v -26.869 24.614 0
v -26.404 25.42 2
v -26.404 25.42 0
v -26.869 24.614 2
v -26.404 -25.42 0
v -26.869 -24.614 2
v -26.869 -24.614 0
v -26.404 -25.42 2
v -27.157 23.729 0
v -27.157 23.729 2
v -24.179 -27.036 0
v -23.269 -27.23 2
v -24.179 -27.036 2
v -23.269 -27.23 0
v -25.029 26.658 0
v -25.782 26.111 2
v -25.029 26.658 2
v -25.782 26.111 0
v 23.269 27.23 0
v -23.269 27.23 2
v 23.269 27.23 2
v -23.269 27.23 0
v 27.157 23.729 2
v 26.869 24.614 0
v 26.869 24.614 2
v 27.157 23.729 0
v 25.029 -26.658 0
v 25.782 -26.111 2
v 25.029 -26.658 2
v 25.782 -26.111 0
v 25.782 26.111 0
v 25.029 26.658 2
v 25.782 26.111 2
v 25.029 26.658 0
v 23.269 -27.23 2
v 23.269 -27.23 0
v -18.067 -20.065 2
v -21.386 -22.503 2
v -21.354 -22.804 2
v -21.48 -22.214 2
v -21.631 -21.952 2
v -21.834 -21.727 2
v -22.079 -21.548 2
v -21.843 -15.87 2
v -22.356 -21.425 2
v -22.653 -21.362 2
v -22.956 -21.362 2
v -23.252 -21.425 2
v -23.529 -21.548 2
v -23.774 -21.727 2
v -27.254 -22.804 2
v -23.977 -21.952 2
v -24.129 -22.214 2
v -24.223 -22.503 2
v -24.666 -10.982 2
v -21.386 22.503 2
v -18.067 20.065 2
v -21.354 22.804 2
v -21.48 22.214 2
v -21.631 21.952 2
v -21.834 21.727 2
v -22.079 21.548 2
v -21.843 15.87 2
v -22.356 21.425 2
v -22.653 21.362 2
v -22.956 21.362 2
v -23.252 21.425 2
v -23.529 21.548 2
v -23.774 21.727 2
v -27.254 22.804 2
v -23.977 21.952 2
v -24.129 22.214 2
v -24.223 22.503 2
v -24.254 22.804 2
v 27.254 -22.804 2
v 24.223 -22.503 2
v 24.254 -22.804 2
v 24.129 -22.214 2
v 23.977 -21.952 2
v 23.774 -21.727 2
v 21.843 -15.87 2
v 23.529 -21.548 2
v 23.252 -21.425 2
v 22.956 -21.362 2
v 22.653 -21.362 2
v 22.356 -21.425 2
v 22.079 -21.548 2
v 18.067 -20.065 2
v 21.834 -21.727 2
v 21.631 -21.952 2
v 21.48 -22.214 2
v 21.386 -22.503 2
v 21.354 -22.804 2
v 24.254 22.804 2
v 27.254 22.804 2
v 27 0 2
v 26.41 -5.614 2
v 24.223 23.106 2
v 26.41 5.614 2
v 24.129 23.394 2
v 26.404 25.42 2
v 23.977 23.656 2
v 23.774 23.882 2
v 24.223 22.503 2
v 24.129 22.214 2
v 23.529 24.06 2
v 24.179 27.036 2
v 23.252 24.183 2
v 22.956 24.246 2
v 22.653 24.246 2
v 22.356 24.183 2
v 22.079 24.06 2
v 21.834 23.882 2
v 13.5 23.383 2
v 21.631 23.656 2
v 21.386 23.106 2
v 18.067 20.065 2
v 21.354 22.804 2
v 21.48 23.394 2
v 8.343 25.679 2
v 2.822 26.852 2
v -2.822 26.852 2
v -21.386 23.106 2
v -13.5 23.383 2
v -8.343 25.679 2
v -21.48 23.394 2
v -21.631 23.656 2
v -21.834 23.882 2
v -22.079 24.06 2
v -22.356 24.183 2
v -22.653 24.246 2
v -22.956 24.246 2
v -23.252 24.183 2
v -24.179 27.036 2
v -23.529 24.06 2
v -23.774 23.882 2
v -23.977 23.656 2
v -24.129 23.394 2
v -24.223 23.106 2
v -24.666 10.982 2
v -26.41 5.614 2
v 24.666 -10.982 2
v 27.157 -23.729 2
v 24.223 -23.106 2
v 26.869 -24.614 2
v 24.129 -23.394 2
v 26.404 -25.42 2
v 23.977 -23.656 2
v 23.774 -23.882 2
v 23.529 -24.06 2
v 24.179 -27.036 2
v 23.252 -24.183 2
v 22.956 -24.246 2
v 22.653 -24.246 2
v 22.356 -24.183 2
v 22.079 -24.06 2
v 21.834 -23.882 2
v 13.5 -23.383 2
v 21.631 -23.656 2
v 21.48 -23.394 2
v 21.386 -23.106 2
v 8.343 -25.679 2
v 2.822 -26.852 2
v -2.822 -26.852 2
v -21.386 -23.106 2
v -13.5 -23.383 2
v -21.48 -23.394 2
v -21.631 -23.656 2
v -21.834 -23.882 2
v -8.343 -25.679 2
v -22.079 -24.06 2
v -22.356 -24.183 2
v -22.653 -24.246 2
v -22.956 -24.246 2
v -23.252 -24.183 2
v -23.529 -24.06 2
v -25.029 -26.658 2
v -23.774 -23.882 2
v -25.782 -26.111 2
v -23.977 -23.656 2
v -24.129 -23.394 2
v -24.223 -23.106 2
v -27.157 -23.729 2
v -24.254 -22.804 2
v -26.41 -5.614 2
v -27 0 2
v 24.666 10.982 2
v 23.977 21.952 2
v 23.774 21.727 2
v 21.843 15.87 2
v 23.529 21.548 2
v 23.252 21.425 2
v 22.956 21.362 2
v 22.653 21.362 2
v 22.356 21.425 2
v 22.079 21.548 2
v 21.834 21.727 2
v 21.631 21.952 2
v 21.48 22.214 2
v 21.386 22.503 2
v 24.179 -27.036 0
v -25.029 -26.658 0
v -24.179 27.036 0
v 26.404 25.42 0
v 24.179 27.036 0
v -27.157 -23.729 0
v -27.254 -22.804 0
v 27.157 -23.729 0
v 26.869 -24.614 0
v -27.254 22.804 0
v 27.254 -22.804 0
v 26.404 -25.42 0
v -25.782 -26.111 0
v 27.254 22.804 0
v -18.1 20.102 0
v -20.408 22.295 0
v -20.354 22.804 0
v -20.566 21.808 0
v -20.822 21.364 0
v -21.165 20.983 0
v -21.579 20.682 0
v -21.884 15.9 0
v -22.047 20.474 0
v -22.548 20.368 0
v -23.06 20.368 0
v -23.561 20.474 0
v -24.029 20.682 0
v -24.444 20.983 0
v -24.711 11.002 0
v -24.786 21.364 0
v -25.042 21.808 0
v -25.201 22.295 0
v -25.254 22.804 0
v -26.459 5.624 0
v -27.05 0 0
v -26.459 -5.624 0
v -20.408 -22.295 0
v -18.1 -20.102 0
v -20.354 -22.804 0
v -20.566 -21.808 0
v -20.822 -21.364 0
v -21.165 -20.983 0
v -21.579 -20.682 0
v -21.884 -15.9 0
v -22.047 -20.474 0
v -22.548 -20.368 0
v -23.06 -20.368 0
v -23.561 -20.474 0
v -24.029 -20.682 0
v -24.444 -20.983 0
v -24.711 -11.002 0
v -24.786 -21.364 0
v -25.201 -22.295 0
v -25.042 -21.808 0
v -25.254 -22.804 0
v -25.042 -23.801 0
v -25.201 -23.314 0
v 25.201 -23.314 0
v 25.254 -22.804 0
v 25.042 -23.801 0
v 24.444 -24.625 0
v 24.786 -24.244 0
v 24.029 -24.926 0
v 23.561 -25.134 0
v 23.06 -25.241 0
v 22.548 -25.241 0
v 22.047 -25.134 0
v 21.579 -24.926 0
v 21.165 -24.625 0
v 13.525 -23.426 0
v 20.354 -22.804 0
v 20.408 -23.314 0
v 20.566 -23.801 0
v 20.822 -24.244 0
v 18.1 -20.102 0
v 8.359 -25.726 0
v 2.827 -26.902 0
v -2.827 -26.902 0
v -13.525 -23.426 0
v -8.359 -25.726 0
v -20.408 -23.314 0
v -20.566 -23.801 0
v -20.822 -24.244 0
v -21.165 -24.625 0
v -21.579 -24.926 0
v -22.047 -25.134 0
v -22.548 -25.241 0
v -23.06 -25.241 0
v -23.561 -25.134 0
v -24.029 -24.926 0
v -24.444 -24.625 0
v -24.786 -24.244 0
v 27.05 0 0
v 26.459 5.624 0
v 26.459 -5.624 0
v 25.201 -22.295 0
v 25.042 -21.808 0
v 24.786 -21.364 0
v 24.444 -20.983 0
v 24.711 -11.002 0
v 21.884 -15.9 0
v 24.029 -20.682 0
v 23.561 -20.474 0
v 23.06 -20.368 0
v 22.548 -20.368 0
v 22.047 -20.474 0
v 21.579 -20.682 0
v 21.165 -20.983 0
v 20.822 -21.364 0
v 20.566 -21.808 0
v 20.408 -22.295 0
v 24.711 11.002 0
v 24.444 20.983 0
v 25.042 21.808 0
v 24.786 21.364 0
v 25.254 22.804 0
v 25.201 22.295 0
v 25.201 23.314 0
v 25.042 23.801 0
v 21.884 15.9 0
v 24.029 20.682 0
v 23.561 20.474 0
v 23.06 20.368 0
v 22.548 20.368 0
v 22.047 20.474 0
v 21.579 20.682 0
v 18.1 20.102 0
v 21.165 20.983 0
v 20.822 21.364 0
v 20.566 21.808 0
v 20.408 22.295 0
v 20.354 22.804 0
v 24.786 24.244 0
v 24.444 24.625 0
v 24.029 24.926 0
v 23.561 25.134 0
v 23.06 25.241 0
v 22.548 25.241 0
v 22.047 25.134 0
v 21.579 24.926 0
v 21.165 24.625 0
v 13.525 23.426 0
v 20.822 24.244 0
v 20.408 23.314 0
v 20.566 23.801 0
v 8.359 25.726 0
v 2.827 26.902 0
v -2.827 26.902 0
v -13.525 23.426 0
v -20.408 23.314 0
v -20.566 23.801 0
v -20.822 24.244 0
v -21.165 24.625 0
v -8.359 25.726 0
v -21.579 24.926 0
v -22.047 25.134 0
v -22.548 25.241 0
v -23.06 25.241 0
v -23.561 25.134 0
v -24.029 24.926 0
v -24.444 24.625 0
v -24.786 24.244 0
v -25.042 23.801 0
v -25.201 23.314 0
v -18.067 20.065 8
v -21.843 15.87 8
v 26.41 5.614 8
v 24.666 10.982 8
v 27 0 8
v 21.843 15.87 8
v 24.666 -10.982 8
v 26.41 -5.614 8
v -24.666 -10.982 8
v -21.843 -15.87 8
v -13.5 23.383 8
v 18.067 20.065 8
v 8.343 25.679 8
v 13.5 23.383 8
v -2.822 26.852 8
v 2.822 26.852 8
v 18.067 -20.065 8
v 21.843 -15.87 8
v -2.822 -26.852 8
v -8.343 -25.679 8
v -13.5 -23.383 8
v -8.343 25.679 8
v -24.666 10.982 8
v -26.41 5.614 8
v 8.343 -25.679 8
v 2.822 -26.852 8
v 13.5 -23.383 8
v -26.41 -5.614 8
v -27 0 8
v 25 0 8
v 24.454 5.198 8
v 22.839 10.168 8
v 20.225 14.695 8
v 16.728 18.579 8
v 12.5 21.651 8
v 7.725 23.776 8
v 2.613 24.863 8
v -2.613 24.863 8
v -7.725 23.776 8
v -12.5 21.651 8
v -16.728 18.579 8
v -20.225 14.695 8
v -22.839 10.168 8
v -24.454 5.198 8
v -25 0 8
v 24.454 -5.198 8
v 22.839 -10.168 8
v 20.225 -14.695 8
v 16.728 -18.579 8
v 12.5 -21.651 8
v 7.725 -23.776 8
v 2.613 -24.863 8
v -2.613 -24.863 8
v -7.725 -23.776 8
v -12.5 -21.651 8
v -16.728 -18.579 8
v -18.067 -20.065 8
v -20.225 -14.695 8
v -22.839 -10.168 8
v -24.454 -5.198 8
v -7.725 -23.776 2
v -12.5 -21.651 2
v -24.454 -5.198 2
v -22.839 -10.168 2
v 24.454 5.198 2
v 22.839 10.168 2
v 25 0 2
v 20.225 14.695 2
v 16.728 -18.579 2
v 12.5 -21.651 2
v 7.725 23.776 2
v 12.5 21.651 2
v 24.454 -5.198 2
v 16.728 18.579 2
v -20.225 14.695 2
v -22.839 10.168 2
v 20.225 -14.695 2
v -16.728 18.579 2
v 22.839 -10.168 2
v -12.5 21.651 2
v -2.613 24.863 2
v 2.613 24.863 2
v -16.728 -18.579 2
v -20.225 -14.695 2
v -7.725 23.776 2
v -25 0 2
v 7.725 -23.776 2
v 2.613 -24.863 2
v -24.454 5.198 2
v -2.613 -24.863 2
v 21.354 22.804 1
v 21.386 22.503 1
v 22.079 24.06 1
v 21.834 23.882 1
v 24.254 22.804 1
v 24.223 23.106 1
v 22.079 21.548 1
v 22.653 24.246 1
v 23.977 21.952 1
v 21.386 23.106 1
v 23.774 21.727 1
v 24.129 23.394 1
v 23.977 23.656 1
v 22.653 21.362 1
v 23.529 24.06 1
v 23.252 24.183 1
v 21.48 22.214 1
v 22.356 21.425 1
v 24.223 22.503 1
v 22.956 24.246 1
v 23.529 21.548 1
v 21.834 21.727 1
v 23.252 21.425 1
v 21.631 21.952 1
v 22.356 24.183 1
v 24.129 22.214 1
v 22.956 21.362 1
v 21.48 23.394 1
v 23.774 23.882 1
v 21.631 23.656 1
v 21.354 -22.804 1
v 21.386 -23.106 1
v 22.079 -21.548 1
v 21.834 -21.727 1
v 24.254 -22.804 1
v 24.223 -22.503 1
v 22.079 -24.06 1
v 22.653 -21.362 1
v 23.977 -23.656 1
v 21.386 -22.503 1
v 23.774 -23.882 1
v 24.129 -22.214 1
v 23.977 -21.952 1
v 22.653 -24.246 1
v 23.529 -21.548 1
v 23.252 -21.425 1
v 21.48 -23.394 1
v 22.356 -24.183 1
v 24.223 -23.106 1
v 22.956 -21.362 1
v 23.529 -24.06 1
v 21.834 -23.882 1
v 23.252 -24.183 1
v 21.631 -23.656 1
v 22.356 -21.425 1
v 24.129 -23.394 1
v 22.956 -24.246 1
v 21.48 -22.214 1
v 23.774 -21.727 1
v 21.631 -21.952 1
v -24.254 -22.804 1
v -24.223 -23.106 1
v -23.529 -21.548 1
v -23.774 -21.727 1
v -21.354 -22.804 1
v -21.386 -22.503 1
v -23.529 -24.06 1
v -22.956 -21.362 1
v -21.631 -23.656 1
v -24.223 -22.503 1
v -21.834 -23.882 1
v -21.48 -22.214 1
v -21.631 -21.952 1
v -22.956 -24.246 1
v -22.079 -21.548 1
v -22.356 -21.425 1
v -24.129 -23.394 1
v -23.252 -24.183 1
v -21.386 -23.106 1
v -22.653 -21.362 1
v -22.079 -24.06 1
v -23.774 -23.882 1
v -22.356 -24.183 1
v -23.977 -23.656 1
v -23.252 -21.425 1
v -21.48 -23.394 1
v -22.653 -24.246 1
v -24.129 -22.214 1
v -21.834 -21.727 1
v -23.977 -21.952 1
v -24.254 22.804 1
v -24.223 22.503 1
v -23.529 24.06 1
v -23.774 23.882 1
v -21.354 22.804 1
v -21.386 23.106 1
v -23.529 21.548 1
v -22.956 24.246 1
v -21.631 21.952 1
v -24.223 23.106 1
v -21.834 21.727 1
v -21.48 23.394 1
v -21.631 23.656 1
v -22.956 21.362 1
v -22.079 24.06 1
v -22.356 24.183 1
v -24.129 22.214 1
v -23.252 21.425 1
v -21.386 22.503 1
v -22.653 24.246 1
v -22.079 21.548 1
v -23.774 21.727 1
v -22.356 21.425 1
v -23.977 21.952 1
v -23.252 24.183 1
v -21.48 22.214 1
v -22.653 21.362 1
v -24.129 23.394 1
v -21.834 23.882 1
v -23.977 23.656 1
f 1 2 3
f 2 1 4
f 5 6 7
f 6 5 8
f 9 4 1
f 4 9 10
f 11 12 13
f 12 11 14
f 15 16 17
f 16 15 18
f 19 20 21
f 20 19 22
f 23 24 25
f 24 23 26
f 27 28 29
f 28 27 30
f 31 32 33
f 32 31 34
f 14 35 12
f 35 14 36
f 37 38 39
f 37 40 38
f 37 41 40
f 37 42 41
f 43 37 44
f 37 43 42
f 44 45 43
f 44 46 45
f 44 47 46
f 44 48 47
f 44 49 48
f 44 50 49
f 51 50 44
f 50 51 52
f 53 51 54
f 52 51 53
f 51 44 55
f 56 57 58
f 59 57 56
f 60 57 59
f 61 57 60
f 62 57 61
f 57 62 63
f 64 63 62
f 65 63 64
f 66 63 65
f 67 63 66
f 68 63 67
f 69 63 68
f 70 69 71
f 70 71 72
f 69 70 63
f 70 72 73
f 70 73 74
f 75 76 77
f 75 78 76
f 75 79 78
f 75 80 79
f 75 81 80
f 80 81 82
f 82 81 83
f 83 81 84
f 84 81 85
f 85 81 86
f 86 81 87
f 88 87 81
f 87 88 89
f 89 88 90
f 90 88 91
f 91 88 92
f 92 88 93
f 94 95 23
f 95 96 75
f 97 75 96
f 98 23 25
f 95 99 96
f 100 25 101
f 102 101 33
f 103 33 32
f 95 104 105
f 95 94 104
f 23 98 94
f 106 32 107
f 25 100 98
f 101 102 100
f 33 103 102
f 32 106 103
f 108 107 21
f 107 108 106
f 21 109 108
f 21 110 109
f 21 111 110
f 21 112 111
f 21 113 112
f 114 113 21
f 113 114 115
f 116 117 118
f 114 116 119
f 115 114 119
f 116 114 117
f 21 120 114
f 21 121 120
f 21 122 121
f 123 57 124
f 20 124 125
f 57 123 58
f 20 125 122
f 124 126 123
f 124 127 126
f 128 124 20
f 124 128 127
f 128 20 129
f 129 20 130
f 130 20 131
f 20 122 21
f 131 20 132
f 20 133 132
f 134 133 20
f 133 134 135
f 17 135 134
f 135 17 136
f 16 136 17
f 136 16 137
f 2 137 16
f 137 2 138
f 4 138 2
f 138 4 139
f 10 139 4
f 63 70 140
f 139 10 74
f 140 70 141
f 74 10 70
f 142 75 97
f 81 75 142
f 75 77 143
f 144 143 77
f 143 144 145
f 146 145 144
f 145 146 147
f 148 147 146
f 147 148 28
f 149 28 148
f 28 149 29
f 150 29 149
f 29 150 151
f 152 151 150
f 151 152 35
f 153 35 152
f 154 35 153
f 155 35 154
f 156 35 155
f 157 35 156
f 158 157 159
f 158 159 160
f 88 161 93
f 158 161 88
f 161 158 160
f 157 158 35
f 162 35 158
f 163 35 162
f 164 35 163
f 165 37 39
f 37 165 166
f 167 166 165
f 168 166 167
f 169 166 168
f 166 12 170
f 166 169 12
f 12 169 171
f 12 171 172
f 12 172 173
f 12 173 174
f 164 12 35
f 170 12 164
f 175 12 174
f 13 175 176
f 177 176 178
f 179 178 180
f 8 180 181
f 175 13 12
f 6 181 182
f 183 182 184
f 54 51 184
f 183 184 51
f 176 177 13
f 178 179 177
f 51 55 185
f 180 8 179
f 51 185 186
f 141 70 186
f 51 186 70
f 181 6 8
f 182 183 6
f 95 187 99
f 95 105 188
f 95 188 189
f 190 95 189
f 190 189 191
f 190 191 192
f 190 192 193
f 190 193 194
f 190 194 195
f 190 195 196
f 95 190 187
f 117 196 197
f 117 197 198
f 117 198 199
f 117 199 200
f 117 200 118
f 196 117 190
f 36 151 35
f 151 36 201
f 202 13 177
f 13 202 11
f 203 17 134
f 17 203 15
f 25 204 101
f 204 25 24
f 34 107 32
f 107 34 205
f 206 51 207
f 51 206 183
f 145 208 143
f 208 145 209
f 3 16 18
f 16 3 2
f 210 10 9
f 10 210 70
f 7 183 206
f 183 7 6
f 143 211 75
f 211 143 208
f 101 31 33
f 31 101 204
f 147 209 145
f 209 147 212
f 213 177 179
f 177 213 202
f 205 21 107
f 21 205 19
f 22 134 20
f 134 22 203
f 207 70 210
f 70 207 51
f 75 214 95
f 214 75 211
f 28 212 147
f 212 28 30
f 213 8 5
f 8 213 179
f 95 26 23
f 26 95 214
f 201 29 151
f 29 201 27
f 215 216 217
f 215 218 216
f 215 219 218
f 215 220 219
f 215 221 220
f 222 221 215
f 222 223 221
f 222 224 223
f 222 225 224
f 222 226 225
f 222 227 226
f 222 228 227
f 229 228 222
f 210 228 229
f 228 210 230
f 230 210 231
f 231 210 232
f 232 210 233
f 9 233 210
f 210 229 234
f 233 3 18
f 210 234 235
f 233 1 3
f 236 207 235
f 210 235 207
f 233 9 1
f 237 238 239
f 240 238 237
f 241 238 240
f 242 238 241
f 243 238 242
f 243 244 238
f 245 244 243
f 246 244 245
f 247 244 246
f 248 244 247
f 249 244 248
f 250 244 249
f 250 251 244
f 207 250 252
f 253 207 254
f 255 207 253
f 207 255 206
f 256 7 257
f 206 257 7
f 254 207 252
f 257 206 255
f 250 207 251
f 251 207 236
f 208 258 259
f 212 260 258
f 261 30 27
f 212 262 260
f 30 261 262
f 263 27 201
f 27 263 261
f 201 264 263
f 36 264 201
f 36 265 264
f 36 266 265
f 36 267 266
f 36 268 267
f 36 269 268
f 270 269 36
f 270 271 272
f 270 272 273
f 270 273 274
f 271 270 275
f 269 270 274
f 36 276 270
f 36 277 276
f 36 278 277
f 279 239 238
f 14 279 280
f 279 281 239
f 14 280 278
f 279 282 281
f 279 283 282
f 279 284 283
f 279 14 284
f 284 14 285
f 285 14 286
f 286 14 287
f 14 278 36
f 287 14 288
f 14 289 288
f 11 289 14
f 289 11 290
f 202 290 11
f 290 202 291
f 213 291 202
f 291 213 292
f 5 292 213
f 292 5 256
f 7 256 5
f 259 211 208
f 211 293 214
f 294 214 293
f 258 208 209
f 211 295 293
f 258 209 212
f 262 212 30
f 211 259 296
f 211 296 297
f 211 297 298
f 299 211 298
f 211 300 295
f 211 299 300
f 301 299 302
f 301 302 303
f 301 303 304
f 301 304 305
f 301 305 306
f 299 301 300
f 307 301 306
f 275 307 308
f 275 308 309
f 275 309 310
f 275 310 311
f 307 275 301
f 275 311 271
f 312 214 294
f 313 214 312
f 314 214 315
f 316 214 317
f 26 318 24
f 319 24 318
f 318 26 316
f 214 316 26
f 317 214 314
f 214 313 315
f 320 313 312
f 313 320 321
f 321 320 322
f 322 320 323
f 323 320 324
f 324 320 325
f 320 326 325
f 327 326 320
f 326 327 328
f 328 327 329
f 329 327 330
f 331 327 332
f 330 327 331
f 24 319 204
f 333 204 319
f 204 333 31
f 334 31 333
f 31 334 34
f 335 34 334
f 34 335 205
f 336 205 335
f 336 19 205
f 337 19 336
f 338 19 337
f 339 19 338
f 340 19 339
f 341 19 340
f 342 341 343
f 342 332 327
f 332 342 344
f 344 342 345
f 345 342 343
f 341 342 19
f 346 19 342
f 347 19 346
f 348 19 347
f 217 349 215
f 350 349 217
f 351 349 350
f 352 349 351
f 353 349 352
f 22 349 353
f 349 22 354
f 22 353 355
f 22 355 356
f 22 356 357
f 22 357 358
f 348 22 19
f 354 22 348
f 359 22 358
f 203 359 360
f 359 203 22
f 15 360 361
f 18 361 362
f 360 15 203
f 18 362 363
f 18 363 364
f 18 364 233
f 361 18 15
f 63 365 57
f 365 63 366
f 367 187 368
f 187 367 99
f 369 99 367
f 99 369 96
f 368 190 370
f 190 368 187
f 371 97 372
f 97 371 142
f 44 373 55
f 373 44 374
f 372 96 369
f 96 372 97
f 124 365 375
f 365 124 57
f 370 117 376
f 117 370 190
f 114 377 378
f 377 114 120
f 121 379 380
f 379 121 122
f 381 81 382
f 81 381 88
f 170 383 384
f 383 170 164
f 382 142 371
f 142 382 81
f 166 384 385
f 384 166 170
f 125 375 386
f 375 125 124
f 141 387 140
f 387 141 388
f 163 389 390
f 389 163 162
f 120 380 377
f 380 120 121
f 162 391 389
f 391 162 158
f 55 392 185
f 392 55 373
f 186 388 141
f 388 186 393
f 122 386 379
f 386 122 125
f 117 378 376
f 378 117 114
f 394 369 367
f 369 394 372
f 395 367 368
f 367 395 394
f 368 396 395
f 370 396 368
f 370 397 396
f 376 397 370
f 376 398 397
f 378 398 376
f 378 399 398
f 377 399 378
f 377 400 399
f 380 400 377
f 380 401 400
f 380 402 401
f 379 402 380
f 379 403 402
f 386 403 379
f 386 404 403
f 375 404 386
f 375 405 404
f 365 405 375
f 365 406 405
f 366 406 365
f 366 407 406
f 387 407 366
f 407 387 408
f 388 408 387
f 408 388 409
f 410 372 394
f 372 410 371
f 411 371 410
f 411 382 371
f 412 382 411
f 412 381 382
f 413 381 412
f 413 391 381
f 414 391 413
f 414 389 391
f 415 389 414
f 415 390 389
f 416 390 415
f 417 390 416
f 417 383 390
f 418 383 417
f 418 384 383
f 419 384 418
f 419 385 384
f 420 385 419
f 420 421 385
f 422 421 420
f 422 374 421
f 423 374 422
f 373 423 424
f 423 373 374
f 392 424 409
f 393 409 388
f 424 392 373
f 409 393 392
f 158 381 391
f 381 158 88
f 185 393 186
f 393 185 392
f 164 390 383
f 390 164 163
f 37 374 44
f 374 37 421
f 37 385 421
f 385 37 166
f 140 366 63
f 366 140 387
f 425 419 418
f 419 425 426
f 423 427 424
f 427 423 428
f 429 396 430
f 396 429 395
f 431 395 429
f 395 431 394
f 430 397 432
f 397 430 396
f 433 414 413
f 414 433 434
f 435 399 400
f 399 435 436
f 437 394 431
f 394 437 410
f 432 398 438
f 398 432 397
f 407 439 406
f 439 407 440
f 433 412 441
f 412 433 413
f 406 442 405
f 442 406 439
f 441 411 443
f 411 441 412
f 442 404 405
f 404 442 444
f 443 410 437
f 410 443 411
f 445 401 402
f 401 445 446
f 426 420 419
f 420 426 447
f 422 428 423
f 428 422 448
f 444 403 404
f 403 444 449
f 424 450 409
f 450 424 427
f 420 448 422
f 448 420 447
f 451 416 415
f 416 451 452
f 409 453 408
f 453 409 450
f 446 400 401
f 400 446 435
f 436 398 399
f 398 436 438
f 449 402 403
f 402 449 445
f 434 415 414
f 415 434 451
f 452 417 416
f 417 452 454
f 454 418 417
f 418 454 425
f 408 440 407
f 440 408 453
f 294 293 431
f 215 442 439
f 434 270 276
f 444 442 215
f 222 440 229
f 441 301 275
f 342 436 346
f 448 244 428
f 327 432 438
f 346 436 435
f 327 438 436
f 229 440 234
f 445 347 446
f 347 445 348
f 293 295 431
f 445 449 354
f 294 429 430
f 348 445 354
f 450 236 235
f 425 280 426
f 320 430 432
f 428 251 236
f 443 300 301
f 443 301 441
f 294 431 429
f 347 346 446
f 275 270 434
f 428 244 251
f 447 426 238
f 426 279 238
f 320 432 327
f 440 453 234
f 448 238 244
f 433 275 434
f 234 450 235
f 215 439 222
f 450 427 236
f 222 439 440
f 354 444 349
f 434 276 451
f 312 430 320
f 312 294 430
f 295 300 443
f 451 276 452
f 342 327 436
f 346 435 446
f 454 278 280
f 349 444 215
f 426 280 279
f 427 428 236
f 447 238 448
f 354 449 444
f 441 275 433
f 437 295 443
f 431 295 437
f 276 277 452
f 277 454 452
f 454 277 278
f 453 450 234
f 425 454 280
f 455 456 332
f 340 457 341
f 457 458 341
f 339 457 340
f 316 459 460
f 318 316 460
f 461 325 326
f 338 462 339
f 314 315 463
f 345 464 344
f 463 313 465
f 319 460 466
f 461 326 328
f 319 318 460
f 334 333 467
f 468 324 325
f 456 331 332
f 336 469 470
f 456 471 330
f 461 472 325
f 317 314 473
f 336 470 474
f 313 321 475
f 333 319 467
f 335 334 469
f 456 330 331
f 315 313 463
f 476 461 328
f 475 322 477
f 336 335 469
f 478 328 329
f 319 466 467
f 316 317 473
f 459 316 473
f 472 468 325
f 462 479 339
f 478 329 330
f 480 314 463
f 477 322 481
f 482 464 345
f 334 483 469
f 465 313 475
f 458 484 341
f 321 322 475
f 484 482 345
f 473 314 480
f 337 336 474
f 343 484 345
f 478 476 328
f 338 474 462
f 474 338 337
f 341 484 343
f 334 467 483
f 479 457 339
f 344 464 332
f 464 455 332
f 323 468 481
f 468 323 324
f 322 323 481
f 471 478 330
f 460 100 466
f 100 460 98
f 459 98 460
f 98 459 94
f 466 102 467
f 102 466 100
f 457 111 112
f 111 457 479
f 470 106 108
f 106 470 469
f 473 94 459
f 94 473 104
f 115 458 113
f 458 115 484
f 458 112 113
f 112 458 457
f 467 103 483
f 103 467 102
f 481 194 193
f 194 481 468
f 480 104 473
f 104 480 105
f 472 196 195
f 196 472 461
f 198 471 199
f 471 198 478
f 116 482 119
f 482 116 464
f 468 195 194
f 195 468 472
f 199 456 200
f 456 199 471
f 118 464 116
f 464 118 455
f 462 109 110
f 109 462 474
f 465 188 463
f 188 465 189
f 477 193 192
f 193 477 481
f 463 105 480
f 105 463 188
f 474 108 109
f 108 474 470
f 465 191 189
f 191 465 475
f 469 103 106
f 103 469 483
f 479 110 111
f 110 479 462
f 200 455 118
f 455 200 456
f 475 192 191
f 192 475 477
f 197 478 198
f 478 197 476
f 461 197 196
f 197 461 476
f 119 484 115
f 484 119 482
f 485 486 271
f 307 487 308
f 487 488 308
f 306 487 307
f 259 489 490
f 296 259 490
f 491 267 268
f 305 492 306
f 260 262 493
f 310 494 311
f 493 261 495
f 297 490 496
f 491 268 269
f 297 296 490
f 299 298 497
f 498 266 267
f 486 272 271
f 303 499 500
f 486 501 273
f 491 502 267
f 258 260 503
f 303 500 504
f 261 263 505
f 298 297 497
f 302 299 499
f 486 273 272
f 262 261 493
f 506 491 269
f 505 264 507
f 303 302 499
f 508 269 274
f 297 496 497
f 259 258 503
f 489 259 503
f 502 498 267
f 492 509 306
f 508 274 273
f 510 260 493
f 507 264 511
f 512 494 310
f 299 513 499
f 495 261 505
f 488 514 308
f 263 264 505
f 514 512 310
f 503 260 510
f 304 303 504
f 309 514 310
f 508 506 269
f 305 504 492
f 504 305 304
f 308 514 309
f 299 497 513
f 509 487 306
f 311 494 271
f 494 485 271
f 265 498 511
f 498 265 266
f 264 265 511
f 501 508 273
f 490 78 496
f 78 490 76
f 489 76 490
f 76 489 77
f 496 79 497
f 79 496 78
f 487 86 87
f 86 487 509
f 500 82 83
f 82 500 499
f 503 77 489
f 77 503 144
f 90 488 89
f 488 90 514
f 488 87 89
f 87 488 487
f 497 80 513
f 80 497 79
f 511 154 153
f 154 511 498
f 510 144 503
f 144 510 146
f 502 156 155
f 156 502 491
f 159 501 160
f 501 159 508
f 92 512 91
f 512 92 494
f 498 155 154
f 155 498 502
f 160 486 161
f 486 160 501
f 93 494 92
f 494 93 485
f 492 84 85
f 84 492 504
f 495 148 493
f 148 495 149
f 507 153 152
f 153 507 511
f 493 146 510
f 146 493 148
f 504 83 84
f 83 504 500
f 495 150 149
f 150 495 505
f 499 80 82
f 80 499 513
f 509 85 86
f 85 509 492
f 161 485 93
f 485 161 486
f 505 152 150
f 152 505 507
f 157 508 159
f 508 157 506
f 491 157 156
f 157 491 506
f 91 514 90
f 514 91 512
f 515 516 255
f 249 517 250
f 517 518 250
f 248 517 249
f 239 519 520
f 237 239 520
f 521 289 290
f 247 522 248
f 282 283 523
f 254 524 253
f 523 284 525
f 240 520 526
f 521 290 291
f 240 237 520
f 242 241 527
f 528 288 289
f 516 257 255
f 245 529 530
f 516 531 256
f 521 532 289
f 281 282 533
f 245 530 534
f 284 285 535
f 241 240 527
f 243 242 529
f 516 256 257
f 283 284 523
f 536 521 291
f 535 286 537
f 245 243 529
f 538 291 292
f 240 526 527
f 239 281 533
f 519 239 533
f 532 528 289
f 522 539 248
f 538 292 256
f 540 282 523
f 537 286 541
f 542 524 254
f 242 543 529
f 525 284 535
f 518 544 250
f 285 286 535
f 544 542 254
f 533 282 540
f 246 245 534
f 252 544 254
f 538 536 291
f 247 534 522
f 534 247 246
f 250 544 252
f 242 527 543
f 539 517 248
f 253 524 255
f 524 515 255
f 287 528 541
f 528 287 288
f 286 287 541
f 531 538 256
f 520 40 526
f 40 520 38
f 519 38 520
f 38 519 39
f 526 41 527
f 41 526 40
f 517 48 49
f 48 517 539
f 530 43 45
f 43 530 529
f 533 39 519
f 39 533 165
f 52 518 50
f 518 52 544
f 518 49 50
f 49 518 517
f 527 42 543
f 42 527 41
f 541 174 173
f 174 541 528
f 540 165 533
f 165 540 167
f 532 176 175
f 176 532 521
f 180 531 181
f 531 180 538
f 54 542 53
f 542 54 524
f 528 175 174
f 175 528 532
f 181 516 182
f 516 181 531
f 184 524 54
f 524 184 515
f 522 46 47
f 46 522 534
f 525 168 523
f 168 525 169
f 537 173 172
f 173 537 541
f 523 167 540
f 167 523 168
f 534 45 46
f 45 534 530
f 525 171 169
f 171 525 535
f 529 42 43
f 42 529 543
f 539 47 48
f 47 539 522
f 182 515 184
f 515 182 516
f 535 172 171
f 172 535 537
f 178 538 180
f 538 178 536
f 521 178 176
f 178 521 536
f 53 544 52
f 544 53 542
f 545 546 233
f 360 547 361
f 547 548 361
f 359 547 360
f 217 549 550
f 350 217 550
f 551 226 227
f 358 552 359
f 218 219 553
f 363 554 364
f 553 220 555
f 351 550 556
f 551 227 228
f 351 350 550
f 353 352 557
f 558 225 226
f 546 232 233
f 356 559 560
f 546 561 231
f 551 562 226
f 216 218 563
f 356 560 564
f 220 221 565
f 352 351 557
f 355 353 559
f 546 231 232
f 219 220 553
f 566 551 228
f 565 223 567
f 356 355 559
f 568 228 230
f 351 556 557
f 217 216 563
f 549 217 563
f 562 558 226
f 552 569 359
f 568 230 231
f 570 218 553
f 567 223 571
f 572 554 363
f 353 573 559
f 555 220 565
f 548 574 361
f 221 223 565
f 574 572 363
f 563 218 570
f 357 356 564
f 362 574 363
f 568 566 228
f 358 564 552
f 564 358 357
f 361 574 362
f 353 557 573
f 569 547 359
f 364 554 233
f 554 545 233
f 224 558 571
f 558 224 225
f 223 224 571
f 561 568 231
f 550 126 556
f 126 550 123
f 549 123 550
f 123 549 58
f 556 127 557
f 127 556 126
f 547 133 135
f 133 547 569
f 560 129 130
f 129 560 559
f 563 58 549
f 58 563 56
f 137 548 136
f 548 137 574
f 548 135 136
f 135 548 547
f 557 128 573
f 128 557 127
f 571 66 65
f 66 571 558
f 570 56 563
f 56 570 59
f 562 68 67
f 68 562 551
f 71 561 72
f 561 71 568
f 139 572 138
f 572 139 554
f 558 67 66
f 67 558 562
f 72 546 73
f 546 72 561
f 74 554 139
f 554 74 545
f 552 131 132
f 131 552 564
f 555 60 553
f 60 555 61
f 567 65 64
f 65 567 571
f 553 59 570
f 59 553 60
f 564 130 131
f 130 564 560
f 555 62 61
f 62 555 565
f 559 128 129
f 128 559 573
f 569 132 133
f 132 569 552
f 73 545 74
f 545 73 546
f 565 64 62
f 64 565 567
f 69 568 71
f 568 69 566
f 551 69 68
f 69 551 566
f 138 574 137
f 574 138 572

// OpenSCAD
// file: params.scad
// ============================================================
// Shared parameters for all smp-*.scad files.
// ============================================================

/* [Shared: bore / mounting-boss geometry] */
bmr_od       = 54.5;   // cutout circle diameter, mm
boss_hole_d  = 2.9;    // screw pilot hole diameter, mm
boss_wall    = 4;      // material around the screw hole, mm
boss_od      = boss_hole_d + 1.5 * boss_wall;  // boss outer diameter, mm
boss_h       = 4;      // boss height above the facet, mm
boss_bc_d    = bmr_od + 10;  // bolt circle diameter (centers), mm
boss_chamfer = 1;      // 45-deg chamfer depth at hole entry, mm
boss_angles  = [45, 135, 225, 315];  // clocked from vertical -> square pattern
$fn          = 30;

/* [Box-only parameters] */
arc_length   = 805.45;  // length along the arc face, mm
arc_depth    = 54.78;   // sagitta / rise of the arc, mm
baffle_space = 1;       // thickness of trim over bmrs
bmr_id       = 44.8;    // cutout circle inner diameter, mm
end_space    = 30;      // clearance: box end -> nearest hole edge (along arc), mm
height       = 70;      // extrusion height, mm
wall_width   = 4;       // shell wall thickness, mm
bar_depth    = 63;      // box depth at mid-span (thinnest point), mm
box_chamfer_leg   = 15; // bottom/end chamfer: leg length along the end edge (height axis), mm
box_chamfer_angle = 30; // bottom/end chamfer: facet angle measured from the bottom-face plane, deg
num_holes    = 10;      // holes are spaced equidistantly to fill the span
divider_after_hole = [4, 5, 6];  // 1-indexed: wall placed between this hole and the next
divider_thickness  = wall_width; // thickness of each dividing wall, mm
boss_hole_depth    = boss_h + 2; // blind: stops 2 mm short of the outer face
back_lip_depth     = 5;          // how far the lip reaches into the cavity from the open back, mm
back_lip_width     = 4;          // width of the lip shelf, mm
m3_ins_od          = 4.2;        // M3 heat-set insert diameter, mm
m3_ins_depth       = 4;          // insert hole depth from the exposed rear face, mm
num_bolts          = 12;         // insert holes, equally spaced around the rear rim
bmr_fn             = 96;         // circle resolution for the BMR cutout only (global $fn stays low for everything else)

/* [Trim-only parameters] */
trim_id          = 50;                  // center bore diameter, mm
trim_id_chamfer  = 2;                   // chamfer depth on the center bore's inner edge, mm
trim_step_od     = bmr_od - 0.5;        // plug OD: 0.5 mm total clearance in the bore
trim_step_depth  = boss_h + 2;          // plug length: boss height + 2 mm
boss_hole        = boss_hole_d;         // == boss_id: screw clearance hole diameter
flange_depth     = 2;                   // flange (cap) thickness, mm
total_depth      = flange_depth + trim_step_depth;  // overall trim height, mm

/* [Backpanel-only parameters] */
panel_thick   = 5;    // backpanel thickness, mm
bp_hole_od    = 6;    // counterbore diameter, mm
bp_hole_depth = 3;    // counterbore depth, mm
bp_hole_id    = 3.1;  // clearance-bore diameter through the rest of the panel, mm

// wire channels: 8 push-threadable bores (one Cat5e conductor each, 2
// per chamber), each a single junction-free lumen -- straight bus ->
// in-plane peel arc -> surfacing arc through the panel face. Left/right
// chambers enter the riser from opposite sides and reuse bus heights,
// so the stack is 6 tall, not 8.
channel_d               = 1.5;   // wire channel diameter, mm (~0.5mm clearance over a ~1.0mm insulated Cat5e conductor)
channel_gap             = 0.5;   // minimum gap between stacked channels, mm
channel_manifold_margin = 0.5;   // clearance added around the bus stack's height when sizing the riser bore, mm
channel_riser_wall      = 1.5;   // wall thickness around the riser bore, mm
channel_pair_dx         = 5;     // x offset between a chamber's 2 entry holes, mm
channel_bend_r          = 10;    // radius of the in-plane peel-off arc (horizontal -> vertical), mm
channel_exit_r          = 8;     // radius of the surfacing arc through the inner face, mm
channel_edge_frac       = 7 / 8; // outer channel pair position, fraction of the half-length (from center toward each edge)
channel_mid_offset      = 10;    // inner channel pair position, mm from center

// keystone jack mount: cutout goes through the panel (panel_thick is the
// mounting wall) so the jack is pluggable from the exterior; the housing
// extends inward to the punch-down terminal. Standard 14.5x16.1mm
// keystone opening (Leviton/Legrand/ICC-style) -- adjust to match a
// specific jack's datasheet if needed.
ks_cutout_w         = 16.1;  // standard keystone cutout width, mm
ks_cutout_h         = 14.5;  // standard keystone cutout height, mm
ks_cutout_clearance = 0.3;   // print clearance added to the cutout so the jack slides through, mm
ks_body_w           = 16.3;  // body/tang-flare cavity width behind the wall, mm
ks_body_h           = 14.8;  // body/tang-flare cavity height behind the wall, mm
ks_jack_len         = 36;    // overall length, panel's outer face to rear of punch-down block, mm
ks_wall             = 4;     // structural wall thickness around the housing, mm
ks_x_frac           = 1 / 3; // keystone housing (and channel gathering point) position along the panel length, fraction from the left edge
ks_y_offset         = 0;     // housing center y, relative to mid-height (mm; change to reposition)

/* [Sectioning for print (archive/box_print.scad / archive/backpanel_print.scad -- repoint at the smp files to reuse)] */
// ~795mm parts cut into 4 segments for a 300mm-class printer. Box prints
// standing on its cut face (near-zero support); panel prints flat.
// Panel cuts stagger off box cuts so the bolted panel bridges every
// joint. Filament dowels + glue + backpanel bolts align each joint.
printer_bed        = 300;      // max printable dimension, mm (Creality K2 Pro)
box_cut_after_hole = [2, 4, 7]; // cut in the gap after hole N (1-indexed); a divider gap cuts at the divider face
panel_cuts         = [-190, 60, 230]; // backpanel cut x positions, mm; kept clear of box cuts/keystone/bolts/channels
joint_pin_d        = 2.0;      // filament-dowel hole diameter, mm (1.75mm filament + slop)
joint_pin_len      = 12;       // total dowel length across a joint, mm (half in each segment)
joint_funnel_d     = 3;        // wire-channel mouth diameter at a panel seam, mm
joint_funnel_len   = 1.5;      // funnel taper length on each side of a seam, mm
// file: smp-common.scad
// ============================================================
// Shared geometry for smp-box / smp-backpanel / smp-trim.
// ============================================================

include <params.scad>

// ---------- Arc geometry ----------
// Solve (1-cos a)/(2a) = sagitta/arc_length for half-angle a (radians)
// by bisection, then R = arc_length / (2a).
function f(a) = (1 - cos(a * 180 / PI)) / (2 * a);
function solve_a(t, lo, hi, i = 0) =
    i > 60 ? (lo + hi) / 2 :
    f((lo + hi) / 2) < t ? solve_a(t, (lo + hi) / 2, hi, i + 1)
                         : solve_a(t, lo, (lo + hi) / 2, i + 1);

half_angle_rad = solve_a(arc_depth / arc_length, 1e-6, PI / 2);
R        = arc_length / (2 * half_angle_rad);   // arc face radius
half_deg = half_angle_rad * 180 / PI;           // half sector angle
Xe       = R * sin(half_deg);                   // half chord (part half-length)
Yc       = bar_depth + R;                       // arc circle center
Xi       = Xe - wall_width;                     // cavity half-length
d_in     = R + wall_width;                      // facet tangency radius

// ---------- Bottom/end-face chamfer geometry ----------
// chamfer_dx: shared with smp-box.scad's end_profile_2d(). The rest is a
// hand-derived, closed-form mitered offset of end_profile_2d() by an
// arbitrary distance d, evaluated at height z -- everything else derives
// the same corner via a genuine offset() of end_profile_2d() (see
// smp-box.scad's end_cavity_2d()) instead, but rim_bolt_pts() below needs
// a z -> x function to place bolts on it, which offset()'s polygon
// output doesn't give for free.
chamfer_dx = box_chamfer_leg / tan(box_chamfer_angle);

function chamfer_ap(d)       = [Xe - chamfer_dx - d * sin(box_chamfer_angle), d * cos(box_chamfer_angle)];
function chamfer_z_outer(d)  = chamfer_ap(d)[1]
    + ((Xe - d) - chamfer_ap(d)[0]) / cos(box_chamfer_angle) * sin(box_chamfer_angle);
function chamfer_x_bottom(d) = chamfer_ap(d)[0]
    + (d - chamfer_ap(d)[1]) / sin(box_chamfer_angle) * cos(box_chamfer_angle);
// x of "end_profile_2d() offset inward by d" at height z -- Xe-d above
// the corner's miter point, tapering to chamfer_x_bottom(d) at z = d.
function chamfer_offset_x(d, z) =
    z >= chamfer_z_outer(d) ? Xe - d :
    chamfer_x_bottom(d) + (z - d) * ((Xe - d) - chamfer_x_bottom(d)) / (chamfer_z_outer(d) - d);

assert(chamfer_z_outer(wall_width) < height - wall_width,
       "the bottom chamfer reaches above the shelled band -- reduce box_chamfer_leg or steepen box_chamfer_angle");
assert(chamfer_x_bottom(wall_width) < Xi,
       "the bottom chamfer's relief wedge is degenerate -- reduce box_chamfer_leg or steepen box_chamfer_angle");

// ---------- BMR hole layout along the arc ----------
// First/last hole edges sit end_space from the ends; centers fill the
// remaining span equidistantly. Also keeps the outermost hole's full OD
// footprint clear of the bottom/end chamfer's x-reach (chamfer_dx) --
// otherwise the chamfer corner can eat into that hole's cutter/facet
// regardless of end_space, since end_space alone was sized before the
// chamfer existed and only accounts for bmr_id, not the wider bmr_od
// the chamfer can actually reach.
edge_deg_end  = (end_space + bmr_id / 2) / R * 180 / PI;         // arc-length margin
edge_deg_cham = half_deg - asin((Xe - chamfer_dx - bmr_od / 2 - 1) / R);  // exact chord margin, +1mm clear
edge_deg  = max(edge_deg_end, edge_deg_cham);
hole_span = 2 * (half_deg - edge_deg);
pitch     = num_holes > 1 ? hole_span * PI / 180 * R / (num_holes - 1) : 0;
assert(num_holes < 2 || pitch > bmr_id,
       "Holes overlap: reduce num_holes or bmr_id");

function hole_t(i) = -hole_span / 2 + (num_holes == 1 ? 0
                        : hole_span * i / (num_holes - 1));   // 0-indexed, degrees
function hole_x(i) = R * sin(hole_t(i));                      // chord x

// ---------- Shared patterns ----------
// n points equally spaced by arc length around a 2*hw x 2*hh rectangle
// centered at the origin, starting top-center, clockwise.
function rect_pattern(n, hw, hh) =
    [for (i = [0:n - 1])
        let (s  = i * (4 * hw + 4 * hh) / n,
             s1 = hw, s2 = s1 + 2 * hh, s3 = s2 + 2 * hw, s4 = s3 + 2 * hh)
        s < s1 ? [s, hh] :
        s < s2 ? [hw, hh - (s - s1)] :
        s < s3 ? [hw - (s - s2), -hh] :
        s < s4 ? [-hw, -hh + (s - s3)] :
                 [-hw + (s - s4), hh]
    ];

// num_bolts M3 positions on the rear rim, centered between the box's
// true outer edge and the lip's inner cutout edge -- chamfer_offset_x()
// at d = m, the same offset used to size the flat rectangle below, so
// bolts near the bottom corners land on the same centerline as
// everywhere else instead of being pushed to one edge of the band.
function rim_bolt_pts() =
    let (m = (wall_width + back_lip_width) / 2)
        [for (p = rect_pattern(num_bolts, Xe - m, height / 2 - m))
            let (z = p[1] + height / 2)
                [sign(p[0]) * min(abs(p[0]), chamfer_offset_x(m, z)), p[1]]];

// xy of the boss clocked at `ang` on the bolt circle (used by the box's
// bosses/pilot holes and the trim's flange/clearance holes)
function boss_xy(ang) = [boss_bc_d / 2 * sin(ang), boss_bc_d / 2 * cos(ang)];

// ---------- Shared cutter ----------
// Chamfered entry bore: overhang cylinder (clean cut through the entry
// face), 45-deg chamfer cone, then a straight bore. Local z = 0 at the
// entry face, increasing into the material.
module entry_bore(d, chamfer, overhang, bore_h) {
    translate([0, 0, -overhang])
        cylinder(h = overhang, d = d + 2 * chamfer);
    cylinder(h = chamfer, d1 = d + 2 * chamfer, d2 = d);
    translate([0, 0, chamfer])
        cylinder(h = bore_h, d = d);
}
// main file
// ============================================================
// Trim cap for each BMR bore: a rounded-rect flange resting on the
// bar's arc face (edges tangent to the 4 mounting bosses) with a plug
// that drops into the bmr_od bore, a chamfered trim_id center opening,
// and 4 countersunk screw clearance holes into the bosses.
// Simplified rewrite of trim.scad -- identical output geometry.
// ============================================================

include <smp-common.scad>

// flange outline: hull of 4 circles on the boss positions -- straight
// edges tangent to each boss, corner fillets exactly boss_od/2
module flange_outline() {
    hull()
        for (ang = boss_angles)
            translate(boss_xy(ang))
                circle(d = boss_od);
}

// z = 0 is the flange's outer face; z increases inward to the plug tip.
module trim_body() {
    difference() {
        union() {
            linear_extrude(flange_depth) flange_outline();
            translate([0, 0, flange_depth])
                cylinder(h = trim_step_depth, d = trim_step_od);
        }
        union() {
            // full-length center bore, overhung past both ends
            translate([0, 0, -0.5])
                cylinder(h = total_depth + 1, d = trim_id);
            // entry chamfer (+0.1 on d1 avoids exact tangency with the plug OD)
            cylinder(h = trim_id_chamfer,
                     d1 = trim_id + 2 * trim_id_chamfer + 0.1, d2 = trim_id);
        }
    }
}

module trim() {
    difference() {
        trim_body();
        // countersunk clearance hole straight through to the plug tip
        for (ang = boss_angles)
            translate(concat(boss_xy(ang), [0]))
                entry_bore(boss_hole, boss_chamfer, 0.6,
                           total_depth - boss_chamfer + 0.6);
    }
}

trim();
